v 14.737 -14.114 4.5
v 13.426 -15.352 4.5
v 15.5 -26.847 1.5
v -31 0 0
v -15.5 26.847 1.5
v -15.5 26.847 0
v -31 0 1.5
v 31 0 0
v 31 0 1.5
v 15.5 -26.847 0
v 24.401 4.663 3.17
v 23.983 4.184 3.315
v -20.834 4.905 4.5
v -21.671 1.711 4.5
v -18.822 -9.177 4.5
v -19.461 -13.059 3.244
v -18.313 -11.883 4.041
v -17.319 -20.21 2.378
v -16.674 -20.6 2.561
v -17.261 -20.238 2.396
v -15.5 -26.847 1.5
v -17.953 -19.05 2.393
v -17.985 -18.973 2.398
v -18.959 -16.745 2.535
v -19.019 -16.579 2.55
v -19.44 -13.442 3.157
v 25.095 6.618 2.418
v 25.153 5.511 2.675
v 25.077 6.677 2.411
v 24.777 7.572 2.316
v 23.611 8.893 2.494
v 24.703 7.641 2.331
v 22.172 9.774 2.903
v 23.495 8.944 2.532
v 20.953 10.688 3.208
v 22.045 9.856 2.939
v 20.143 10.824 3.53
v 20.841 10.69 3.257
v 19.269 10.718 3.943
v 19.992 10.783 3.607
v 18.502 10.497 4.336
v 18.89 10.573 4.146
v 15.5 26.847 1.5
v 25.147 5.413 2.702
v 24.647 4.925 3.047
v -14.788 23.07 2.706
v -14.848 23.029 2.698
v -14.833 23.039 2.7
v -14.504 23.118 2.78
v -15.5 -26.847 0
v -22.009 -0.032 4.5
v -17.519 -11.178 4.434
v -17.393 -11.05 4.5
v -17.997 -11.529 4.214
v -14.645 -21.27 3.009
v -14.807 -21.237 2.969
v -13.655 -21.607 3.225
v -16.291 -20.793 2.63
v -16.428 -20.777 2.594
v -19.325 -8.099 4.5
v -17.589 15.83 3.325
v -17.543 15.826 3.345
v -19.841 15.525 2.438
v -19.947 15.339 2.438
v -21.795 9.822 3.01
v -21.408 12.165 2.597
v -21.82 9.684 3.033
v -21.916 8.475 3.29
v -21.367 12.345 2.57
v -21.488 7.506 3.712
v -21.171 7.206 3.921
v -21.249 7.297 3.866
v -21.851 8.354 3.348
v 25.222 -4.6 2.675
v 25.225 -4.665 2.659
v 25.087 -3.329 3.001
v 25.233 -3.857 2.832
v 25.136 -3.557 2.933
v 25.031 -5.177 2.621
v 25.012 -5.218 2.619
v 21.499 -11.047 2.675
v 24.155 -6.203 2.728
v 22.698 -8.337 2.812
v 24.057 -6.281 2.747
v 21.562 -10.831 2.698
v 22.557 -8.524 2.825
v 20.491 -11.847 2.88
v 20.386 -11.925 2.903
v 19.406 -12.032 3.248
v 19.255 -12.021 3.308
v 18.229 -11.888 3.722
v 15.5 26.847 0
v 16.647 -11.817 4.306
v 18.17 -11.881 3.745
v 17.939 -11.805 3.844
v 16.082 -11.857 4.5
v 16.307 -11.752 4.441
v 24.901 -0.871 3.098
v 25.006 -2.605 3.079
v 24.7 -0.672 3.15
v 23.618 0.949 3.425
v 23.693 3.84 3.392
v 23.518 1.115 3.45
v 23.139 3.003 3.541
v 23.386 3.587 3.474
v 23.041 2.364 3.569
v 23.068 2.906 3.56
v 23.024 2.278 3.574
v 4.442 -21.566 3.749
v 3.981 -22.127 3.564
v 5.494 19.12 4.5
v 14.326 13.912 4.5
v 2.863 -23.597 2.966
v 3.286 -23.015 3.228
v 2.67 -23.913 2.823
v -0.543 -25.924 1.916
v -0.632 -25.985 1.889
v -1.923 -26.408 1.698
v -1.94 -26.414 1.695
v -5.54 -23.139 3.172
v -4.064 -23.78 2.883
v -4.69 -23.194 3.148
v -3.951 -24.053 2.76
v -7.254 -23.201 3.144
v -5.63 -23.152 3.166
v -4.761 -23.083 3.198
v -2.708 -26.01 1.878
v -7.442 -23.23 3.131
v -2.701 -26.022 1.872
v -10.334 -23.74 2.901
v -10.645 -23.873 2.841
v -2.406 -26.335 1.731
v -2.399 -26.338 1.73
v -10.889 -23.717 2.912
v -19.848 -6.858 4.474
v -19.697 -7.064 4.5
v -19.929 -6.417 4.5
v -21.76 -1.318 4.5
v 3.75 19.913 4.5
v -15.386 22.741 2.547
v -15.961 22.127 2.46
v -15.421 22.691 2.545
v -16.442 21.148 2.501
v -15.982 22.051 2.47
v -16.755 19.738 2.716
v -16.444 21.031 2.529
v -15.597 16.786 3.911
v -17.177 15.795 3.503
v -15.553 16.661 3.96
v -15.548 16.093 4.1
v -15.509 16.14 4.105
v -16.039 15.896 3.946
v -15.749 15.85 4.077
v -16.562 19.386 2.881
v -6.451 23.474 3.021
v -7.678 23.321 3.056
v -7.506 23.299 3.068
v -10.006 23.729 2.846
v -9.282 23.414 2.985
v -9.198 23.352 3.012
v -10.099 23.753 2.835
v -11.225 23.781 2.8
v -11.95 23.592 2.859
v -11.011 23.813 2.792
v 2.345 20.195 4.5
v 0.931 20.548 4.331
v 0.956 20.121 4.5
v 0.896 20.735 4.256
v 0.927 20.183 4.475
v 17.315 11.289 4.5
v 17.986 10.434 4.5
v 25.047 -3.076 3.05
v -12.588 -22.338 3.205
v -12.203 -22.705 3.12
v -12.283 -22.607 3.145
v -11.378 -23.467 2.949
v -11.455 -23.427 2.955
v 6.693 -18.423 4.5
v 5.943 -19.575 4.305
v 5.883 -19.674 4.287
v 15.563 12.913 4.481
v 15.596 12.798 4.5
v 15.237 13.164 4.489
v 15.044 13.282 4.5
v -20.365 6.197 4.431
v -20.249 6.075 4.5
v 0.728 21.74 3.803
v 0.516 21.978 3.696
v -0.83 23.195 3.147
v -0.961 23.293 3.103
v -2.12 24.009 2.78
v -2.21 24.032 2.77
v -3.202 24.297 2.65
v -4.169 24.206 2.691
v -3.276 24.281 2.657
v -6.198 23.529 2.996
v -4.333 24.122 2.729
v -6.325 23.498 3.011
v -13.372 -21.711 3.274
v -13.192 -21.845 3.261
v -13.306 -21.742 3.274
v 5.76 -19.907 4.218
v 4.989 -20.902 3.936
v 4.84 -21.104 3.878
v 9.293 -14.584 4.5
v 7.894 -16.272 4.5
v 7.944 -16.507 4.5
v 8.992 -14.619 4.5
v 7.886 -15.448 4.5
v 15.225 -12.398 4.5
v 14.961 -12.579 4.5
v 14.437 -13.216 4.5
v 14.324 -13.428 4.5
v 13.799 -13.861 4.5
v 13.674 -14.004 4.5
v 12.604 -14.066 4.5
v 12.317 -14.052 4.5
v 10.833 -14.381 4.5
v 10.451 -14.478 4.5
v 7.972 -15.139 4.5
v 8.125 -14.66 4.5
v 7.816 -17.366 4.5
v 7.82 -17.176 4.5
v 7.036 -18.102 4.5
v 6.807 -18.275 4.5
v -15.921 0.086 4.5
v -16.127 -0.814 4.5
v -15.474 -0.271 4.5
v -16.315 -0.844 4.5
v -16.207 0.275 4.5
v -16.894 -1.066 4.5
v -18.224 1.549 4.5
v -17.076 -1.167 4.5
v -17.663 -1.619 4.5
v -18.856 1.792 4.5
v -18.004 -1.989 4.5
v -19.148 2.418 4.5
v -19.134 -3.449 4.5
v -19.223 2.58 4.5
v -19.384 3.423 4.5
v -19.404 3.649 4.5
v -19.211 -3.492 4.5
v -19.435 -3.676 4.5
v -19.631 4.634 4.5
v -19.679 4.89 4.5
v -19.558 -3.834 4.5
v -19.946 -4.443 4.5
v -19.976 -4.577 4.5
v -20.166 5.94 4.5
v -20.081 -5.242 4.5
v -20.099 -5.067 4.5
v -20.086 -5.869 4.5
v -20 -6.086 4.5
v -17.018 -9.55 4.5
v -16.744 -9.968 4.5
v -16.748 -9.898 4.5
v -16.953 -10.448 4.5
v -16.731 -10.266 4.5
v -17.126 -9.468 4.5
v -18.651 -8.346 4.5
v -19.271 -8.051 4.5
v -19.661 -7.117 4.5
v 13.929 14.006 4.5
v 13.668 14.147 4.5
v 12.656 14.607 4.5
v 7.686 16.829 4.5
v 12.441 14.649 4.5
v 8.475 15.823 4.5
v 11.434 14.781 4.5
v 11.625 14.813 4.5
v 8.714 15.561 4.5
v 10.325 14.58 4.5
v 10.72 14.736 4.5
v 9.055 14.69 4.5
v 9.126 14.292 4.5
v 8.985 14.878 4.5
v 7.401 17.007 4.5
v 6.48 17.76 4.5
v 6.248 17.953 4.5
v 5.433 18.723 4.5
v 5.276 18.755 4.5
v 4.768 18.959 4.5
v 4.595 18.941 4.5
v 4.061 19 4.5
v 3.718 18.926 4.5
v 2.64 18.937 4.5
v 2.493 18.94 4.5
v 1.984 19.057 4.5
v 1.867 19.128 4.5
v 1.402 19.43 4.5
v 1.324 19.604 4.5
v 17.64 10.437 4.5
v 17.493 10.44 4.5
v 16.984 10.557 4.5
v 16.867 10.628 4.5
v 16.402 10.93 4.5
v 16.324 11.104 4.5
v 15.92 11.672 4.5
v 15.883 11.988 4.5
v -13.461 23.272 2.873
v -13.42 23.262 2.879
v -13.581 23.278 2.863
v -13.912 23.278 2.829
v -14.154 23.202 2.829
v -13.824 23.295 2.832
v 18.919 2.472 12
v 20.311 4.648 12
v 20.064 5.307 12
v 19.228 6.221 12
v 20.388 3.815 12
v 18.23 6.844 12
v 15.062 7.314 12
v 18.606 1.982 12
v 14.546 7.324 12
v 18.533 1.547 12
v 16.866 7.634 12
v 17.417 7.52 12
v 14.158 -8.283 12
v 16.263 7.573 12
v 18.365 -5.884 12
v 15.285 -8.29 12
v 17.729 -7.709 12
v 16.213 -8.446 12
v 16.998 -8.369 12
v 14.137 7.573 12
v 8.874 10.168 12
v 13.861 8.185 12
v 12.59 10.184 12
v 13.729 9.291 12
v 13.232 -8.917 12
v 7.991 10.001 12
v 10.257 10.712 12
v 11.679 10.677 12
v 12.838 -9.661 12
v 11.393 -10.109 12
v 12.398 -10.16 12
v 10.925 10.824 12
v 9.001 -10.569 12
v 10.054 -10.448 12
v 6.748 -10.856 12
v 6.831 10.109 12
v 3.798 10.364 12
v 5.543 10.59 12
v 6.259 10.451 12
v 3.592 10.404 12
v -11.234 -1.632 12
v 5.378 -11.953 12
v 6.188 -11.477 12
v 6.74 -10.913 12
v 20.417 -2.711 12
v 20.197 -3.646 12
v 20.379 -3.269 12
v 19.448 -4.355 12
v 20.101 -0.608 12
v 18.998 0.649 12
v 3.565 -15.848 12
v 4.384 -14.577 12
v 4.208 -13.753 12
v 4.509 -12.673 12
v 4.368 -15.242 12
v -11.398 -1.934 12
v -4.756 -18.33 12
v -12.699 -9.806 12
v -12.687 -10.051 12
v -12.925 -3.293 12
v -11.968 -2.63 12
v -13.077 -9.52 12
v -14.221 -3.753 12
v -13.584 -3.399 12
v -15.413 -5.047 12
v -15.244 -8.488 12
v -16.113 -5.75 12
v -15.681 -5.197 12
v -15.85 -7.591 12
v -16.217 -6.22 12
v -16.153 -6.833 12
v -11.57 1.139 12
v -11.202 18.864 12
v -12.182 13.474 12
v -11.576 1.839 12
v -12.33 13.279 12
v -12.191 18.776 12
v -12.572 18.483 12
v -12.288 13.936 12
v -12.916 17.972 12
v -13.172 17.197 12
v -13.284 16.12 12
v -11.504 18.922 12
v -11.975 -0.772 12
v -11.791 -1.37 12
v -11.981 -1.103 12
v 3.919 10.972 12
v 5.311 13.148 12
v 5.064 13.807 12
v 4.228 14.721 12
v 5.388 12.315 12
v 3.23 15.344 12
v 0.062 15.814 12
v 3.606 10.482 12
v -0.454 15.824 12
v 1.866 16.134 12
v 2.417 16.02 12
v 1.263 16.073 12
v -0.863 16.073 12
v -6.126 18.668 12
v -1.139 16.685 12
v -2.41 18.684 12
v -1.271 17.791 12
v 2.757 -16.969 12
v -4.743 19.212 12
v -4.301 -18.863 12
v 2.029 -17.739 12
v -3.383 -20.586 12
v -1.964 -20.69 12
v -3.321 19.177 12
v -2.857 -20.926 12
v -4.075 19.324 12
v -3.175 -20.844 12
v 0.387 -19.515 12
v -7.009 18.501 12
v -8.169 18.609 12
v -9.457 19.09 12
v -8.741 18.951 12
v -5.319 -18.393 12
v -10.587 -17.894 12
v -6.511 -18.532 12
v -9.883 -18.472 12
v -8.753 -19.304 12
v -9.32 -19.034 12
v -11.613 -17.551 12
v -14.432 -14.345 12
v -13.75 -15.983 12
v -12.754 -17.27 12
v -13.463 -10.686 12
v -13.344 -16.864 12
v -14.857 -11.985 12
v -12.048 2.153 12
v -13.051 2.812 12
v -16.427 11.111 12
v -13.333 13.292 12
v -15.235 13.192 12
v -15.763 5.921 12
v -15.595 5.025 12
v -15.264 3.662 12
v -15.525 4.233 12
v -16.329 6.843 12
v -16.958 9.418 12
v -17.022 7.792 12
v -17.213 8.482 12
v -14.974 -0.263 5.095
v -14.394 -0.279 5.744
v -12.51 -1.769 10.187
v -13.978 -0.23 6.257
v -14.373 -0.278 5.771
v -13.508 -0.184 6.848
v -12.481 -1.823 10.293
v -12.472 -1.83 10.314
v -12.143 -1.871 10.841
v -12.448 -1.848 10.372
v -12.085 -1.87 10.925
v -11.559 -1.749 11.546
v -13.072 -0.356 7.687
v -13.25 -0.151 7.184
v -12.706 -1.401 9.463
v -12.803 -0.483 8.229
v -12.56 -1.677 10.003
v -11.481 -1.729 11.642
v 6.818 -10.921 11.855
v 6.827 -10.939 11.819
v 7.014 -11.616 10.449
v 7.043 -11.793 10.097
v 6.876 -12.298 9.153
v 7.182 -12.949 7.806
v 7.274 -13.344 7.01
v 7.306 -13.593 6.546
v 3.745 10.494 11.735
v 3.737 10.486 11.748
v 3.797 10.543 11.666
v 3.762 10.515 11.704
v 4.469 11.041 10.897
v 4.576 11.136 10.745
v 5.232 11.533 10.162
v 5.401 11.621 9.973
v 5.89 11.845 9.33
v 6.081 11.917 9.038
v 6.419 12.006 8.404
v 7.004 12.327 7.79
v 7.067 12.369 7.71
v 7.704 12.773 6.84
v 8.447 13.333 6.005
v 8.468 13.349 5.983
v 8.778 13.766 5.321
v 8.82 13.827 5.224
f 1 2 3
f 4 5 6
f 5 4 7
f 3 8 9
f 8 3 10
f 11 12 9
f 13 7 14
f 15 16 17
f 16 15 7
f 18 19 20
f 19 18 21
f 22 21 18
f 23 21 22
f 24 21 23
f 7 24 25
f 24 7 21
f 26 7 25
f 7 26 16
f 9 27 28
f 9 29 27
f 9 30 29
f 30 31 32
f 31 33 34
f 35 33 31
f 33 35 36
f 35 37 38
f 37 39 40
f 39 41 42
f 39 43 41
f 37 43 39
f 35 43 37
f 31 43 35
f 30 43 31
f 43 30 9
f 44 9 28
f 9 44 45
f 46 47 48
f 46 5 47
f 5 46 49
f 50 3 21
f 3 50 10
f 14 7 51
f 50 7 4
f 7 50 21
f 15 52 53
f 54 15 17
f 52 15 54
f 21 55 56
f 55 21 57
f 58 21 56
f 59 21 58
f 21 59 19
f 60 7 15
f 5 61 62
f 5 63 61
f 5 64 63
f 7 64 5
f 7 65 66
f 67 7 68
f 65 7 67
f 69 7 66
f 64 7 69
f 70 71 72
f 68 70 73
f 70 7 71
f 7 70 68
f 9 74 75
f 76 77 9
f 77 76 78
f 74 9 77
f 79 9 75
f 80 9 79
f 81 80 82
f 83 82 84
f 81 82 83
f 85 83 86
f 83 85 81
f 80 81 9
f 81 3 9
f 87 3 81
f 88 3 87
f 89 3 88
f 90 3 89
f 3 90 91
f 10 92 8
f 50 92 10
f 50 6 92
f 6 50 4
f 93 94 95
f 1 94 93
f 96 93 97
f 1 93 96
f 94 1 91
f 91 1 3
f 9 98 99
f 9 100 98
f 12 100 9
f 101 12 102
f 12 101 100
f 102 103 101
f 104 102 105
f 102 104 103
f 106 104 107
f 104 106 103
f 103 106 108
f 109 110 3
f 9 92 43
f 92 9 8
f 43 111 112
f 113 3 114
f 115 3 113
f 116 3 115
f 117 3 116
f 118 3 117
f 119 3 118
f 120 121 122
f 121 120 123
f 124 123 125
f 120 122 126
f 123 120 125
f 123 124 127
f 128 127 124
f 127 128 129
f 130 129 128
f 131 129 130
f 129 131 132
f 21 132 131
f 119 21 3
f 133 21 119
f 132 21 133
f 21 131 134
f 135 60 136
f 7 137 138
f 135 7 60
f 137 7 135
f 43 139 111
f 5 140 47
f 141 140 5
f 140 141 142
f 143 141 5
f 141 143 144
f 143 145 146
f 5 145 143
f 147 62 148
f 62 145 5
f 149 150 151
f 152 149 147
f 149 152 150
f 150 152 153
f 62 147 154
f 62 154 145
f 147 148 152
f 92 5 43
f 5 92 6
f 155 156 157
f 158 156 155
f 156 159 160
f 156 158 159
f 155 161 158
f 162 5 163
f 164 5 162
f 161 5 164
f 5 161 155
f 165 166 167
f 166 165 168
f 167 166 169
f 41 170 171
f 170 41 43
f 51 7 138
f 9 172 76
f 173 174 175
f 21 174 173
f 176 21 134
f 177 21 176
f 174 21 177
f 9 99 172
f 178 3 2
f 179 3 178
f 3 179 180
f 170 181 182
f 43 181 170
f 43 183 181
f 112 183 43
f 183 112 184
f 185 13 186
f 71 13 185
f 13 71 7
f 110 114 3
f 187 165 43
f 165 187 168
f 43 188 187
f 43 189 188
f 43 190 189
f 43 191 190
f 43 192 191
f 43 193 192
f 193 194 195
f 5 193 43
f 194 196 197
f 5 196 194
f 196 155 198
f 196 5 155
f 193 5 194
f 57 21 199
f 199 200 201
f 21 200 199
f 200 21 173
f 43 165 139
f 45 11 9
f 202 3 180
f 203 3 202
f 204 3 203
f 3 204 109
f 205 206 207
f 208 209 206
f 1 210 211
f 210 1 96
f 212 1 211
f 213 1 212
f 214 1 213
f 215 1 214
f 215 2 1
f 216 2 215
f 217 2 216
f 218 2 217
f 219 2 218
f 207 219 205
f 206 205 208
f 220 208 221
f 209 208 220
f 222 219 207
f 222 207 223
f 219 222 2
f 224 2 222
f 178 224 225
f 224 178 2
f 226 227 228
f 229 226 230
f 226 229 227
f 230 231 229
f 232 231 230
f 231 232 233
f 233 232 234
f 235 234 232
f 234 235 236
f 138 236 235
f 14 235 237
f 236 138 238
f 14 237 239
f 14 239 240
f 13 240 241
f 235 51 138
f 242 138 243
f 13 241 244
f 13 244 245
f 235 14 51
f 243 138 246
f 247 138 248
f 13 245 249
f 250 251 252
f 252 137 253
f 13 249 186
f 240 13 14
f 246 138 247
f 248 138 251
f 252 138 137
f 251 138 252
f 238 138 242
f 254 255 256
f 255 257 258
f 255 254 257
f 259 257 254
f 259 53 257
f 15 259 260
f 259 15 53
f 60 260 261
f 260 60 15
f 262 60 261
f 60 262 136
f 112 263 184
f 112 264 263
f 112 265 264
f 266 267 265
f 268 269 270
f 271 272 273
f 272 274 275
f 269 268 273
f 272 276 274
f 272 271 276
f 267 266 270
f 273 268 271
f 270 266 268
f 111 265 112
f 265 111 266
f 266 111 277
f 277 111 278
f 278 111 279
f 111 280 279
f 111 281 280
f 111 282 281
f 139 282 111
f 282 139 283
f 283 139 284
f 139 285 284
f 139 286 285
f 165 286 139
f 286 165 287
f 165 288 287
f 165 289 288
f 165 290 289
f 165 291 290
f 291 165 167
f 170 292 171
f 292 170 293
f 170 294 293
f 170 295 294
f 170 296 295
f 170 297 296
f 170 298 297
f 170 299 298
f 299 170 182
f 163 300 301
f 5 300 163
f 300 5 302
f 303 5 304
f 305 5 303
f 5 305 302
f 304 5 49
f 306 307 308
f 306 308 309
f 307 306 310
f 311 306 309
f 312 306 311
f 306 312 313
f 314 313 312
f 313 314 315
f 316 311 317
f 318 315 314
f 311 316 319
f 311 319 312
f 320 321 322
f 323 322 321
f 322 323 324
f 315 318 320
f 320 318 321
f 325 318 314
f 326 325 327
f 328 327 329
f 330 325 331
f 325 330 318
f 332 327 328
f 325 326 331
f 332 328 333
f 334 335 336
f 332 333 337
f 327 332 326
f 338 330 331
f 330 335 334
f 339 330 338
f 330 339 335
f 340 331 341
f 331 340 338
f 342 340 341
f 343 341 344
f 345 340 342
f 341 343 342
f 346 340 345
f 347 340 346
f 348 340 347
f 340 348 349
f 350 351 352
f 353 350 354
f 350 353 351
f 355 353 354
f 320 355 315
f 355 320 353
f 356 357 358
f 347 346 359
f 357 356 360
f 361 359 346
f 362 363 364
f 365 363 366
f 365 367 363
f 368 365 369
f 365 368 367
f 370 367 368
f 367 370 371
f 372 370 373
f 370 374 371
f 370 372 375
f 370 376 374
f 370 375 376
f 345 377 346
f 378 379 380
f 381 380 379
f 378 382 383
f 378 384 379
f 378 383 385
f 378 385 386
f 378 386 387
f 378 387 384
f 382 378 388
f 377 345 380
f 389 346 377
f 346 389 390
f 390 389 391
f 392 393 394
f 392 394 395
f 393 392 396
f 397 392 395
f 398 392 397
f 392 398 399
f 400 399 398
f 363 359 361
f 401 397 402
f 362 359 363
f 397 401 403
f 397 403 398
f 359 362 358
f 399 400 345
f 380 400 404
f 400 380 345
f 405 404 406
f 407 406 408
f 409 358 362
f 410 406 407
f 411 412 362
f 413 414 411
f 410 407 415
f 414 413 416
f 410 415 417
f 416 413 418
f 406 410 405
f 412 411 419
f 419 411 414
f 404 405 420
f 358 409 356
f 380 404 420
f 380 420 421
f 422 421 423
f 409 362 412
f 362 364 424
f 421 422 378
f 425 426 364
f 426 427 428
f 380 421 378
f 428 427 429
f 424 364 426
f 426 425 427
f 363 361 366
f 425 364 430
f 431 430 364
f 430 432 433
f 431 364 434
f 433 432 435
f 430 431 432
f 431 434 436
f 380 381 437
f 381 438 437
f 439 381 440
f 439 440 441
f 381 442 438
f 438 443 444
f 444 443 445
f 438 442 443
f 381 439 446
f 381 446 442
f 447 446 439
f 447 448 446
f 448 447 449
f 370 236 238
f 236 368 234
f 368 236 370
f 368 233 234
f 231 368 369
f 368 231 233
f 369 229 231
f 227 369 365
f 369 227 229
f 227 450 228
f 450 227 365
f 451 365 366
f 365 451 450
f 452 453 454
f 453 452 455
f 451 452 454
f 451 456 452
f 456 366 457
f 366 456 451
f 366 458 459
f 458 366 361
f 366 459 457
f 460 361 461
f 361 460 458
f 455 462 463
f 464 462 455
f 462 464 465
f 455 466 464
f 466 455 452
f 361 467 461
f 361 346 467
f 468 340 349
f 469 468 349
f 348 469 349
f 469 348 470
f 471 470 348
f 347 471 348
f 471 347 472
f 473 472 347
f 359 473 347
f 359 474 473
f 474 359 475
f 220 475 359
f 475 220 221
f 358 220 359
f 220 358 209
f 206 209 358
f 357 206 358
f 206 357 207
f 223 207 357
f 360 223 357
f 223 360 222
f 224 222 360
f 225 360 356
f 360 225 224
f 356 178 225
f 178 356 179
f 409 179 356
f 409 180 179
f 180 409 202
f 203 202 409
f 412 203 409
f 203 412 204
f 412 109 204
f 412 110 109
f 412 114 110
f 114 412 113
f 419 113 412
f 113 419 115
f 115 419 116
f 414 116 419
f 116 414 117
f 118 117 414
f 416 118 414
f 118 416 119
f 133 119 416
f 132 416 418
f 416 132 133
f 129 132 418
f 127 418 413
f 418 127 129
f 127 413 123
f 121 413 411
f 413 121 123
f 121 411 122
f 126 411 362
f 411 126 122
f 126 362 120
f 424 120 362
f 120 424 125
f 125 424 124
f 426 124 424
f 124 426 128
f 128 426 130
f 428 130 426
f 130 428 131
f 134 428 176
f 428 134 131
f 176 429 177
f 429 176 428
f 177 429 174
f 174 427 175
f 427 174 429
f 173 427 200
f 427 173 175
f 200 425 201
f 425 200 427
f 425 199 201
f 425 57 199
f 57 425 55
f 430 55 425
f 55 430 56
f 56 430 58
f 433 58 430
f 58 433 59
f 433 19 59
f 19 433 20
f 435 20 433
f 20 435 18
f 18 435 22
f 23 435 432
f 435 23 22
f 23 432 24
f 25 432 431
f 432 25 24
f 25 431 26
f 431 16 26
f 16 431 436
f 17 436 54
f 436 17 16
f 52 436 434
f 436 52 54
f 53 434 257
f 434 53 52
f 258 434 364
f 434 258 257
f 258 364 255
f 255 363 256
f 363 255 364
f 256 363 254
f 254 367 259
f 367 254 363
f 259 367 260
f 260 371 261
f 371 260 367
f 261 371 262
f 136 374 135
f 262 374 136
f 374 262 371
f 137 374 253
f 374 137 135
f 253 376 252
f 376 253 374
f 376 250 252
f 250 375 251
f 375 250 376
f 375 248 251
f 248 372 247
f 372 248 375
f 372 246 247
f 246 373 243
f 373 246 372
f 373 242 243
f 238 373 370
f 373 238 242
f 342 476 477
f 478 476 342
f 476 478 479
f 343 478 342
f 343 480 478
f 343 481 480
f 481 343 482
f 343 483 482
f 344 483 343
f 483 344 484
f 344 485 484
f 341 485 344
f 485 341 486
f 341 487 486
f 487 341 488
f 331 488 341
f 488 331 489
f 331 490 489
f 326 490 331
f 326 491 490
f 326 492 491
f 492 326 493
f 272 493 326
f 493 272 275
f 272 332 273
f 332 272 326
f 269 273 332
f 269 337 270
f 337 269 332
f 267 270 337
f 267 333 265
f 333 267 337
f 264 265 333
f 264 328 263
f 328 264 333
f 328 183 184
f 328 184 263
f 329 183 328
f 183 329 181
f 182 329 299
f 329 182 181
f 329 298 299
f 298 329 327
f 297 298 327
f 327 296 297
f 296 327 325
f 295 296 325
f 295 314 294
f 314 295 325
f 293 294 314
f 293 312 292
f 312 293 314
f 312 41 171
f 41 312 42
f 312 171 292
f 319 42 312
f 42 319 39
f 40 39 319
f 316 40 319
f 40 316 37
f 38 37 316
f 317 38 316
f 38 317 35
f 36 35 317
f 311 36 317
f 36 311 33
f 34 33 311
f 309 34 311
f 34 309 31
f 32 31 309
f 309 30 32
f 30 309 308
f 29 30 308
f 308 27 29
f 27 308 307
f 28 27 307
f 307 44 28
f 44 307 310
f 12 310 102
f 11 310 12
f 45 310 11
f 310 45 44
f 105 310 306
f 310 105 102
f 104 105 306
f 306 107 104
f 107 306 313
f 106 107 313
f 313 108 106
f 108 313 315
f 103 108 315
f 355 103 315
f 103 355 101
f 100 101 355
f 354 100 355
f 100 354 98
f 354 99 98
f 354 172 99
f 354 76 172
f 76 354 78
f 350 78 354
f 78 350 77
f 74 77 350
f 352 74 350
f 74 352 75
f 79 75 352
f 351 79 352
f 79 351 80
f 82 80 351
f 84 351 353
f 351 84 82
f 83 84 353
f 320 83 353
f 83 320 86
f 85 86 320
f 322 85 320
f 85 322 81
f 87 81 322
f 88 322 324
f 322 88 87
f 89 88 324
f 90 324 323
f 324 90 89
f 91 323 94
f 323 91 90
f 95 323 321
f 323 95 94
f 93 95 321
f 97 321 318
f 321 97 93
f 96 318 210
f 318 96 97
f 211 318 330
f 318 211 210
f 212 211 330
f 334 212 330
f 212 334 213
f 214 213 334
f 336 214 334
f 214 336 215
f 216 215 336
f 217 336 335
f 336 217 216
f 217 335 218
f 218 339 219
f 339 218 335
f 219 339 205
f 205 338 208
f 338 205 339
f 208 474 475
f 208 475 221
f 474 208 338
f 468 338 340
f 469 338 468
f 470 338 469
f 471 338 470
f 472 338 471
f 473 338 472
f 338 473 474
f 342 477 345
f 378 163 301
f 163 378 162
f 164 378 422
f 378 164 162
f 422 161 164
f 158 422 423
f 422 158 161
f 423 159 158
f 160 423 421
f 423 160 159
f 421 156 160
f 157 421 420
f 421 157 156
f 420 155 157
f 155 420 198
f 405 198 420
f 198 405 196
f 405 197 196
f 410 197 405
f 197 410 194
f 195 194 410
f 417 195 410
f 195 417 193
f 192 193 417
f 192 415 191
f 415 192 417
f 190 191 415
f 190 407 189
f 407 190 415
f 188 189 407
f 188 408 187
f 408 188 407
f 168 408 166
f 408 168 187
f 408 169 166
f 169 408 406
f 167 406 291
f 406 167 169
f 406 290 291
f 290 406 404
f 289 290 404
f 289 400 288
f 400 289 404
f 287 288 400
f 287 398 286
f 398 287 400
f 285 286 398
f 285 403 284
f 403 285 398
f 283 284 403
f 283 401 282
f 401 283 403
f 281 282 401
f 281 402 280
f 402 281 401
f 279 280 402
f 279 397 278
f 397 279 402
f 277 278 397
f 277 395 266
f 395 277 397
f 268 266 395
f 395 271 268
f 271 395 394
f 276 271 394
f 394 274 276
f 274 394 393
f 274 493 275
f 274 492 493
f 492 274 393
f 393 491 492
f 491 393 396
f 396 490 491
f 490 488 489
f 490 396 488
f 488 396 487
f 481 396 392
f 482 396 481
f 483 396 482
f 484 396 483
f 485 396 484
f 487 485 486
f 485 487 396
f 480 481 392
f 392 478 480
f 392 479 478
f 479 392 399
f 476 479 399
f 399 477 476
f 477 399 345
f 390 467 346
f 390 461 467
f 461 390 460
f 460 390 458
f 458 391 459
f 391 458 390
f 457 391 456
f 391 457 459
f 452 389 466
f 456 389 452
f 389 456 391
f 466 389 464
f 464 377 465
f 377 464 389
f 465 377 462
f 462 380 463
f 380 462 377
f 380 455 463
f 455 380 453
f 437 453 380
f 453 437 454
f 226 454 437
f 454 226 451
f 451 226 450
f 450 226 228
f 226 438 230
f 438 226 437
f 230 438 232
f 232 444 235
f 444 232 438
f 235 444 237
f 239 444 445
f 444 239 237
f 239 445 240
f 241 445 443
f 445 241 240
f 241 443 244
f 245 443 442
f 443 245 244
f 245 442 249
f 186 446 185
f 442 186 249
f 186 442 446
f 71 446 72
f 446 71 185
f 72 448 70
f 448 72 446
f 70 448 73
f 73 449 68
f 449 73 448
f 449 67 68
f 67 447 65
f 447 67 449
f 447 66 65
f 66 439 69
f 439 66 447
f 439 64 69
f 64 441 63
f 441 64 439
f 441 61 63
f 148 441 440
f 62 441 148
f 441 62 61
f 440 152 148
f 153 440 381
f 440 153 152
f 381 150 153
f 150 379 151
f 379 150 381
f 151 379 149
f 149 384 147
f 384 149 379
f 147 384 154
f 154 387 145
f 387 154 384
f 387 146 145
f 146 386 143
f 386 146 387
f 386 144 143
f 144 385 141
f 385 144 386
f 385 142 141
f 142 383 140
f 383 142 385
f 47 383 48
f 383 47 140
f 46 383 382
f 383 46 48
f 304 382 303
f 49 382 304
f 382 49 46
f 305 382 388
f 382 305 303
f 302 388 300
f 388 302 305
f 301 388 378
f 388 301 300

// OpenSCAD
/* Memoir '44 Tile Set: Hills
 *
 * This file defines modules to build three types of hills:
 * - simpleHillTile - simple, one-tile hill
 * - connectedHillTile - one side is designed to abut another 
 *                       connectedHillTile or doubleConnectedHillTile
 * - doubleConnectedHillTile - two sides designed to abut others
 *
 * Obviously one could simply use the freestanding version.
 *
 * All three follow the same approach, which is basically to use a hull() of
 * a blank tile in conjunction with an extruded polygon (the fooPolyhedron()
 * call) to create a base, followed by the same polygon extruded with an
 * angled side to create the sides of the hill and hilltop.
 *
 * In case you are interested, the polyhedron code was generated by drawing
 * the polygon in Inkscape and then using a perl script that parses the
 * output of the Inkscape SCAD output routines. These polyhedrons are kept
 * in separate SCAD files in case I need to regenerate them.
 *
 * Dimensions of a tile (as a reminder):
 * - point to point, tile is 62mm
 *   - center to center of edge is 26.847mm
 * - stock, cardboard tiles in Memoir are approx. 1.5mm tall
 */

include <hill-polyhedron.scad>

simpleMtnTile();

module mtnBlankTile(height=1.5) {
    cylinder(r = 62/2, h = height, $fn = 6, center = [0,0]);
}

module simpleMtnTile(height=12) {
    hull() {
	mtnBlankTile();
	scale([0.80,0.80,1]) hillPolyhedron(height=4.5,angle=0);
    }

    translate([-4,-9.0,1.5]) scale([0.65,0.65,1]) rotate([0,0,40])
	hillPolyhedron(height=height-1.5,angle=40);
    translate([10.0,0,1.5]) scale([0.65,0.65,1])
	hillPolyhedron(height=height-1.5,angle=40);
    translate([-5.0,8.5,1.5]) scale([0.65,0.65,1])
	hillPolyhedron(height=height-1.5,angle=40);
}

/*
 * Local variables:
 *  mode: C
 *  c-indent-level: 4
 *  c-basic-offset: 4
 * End:
 */
